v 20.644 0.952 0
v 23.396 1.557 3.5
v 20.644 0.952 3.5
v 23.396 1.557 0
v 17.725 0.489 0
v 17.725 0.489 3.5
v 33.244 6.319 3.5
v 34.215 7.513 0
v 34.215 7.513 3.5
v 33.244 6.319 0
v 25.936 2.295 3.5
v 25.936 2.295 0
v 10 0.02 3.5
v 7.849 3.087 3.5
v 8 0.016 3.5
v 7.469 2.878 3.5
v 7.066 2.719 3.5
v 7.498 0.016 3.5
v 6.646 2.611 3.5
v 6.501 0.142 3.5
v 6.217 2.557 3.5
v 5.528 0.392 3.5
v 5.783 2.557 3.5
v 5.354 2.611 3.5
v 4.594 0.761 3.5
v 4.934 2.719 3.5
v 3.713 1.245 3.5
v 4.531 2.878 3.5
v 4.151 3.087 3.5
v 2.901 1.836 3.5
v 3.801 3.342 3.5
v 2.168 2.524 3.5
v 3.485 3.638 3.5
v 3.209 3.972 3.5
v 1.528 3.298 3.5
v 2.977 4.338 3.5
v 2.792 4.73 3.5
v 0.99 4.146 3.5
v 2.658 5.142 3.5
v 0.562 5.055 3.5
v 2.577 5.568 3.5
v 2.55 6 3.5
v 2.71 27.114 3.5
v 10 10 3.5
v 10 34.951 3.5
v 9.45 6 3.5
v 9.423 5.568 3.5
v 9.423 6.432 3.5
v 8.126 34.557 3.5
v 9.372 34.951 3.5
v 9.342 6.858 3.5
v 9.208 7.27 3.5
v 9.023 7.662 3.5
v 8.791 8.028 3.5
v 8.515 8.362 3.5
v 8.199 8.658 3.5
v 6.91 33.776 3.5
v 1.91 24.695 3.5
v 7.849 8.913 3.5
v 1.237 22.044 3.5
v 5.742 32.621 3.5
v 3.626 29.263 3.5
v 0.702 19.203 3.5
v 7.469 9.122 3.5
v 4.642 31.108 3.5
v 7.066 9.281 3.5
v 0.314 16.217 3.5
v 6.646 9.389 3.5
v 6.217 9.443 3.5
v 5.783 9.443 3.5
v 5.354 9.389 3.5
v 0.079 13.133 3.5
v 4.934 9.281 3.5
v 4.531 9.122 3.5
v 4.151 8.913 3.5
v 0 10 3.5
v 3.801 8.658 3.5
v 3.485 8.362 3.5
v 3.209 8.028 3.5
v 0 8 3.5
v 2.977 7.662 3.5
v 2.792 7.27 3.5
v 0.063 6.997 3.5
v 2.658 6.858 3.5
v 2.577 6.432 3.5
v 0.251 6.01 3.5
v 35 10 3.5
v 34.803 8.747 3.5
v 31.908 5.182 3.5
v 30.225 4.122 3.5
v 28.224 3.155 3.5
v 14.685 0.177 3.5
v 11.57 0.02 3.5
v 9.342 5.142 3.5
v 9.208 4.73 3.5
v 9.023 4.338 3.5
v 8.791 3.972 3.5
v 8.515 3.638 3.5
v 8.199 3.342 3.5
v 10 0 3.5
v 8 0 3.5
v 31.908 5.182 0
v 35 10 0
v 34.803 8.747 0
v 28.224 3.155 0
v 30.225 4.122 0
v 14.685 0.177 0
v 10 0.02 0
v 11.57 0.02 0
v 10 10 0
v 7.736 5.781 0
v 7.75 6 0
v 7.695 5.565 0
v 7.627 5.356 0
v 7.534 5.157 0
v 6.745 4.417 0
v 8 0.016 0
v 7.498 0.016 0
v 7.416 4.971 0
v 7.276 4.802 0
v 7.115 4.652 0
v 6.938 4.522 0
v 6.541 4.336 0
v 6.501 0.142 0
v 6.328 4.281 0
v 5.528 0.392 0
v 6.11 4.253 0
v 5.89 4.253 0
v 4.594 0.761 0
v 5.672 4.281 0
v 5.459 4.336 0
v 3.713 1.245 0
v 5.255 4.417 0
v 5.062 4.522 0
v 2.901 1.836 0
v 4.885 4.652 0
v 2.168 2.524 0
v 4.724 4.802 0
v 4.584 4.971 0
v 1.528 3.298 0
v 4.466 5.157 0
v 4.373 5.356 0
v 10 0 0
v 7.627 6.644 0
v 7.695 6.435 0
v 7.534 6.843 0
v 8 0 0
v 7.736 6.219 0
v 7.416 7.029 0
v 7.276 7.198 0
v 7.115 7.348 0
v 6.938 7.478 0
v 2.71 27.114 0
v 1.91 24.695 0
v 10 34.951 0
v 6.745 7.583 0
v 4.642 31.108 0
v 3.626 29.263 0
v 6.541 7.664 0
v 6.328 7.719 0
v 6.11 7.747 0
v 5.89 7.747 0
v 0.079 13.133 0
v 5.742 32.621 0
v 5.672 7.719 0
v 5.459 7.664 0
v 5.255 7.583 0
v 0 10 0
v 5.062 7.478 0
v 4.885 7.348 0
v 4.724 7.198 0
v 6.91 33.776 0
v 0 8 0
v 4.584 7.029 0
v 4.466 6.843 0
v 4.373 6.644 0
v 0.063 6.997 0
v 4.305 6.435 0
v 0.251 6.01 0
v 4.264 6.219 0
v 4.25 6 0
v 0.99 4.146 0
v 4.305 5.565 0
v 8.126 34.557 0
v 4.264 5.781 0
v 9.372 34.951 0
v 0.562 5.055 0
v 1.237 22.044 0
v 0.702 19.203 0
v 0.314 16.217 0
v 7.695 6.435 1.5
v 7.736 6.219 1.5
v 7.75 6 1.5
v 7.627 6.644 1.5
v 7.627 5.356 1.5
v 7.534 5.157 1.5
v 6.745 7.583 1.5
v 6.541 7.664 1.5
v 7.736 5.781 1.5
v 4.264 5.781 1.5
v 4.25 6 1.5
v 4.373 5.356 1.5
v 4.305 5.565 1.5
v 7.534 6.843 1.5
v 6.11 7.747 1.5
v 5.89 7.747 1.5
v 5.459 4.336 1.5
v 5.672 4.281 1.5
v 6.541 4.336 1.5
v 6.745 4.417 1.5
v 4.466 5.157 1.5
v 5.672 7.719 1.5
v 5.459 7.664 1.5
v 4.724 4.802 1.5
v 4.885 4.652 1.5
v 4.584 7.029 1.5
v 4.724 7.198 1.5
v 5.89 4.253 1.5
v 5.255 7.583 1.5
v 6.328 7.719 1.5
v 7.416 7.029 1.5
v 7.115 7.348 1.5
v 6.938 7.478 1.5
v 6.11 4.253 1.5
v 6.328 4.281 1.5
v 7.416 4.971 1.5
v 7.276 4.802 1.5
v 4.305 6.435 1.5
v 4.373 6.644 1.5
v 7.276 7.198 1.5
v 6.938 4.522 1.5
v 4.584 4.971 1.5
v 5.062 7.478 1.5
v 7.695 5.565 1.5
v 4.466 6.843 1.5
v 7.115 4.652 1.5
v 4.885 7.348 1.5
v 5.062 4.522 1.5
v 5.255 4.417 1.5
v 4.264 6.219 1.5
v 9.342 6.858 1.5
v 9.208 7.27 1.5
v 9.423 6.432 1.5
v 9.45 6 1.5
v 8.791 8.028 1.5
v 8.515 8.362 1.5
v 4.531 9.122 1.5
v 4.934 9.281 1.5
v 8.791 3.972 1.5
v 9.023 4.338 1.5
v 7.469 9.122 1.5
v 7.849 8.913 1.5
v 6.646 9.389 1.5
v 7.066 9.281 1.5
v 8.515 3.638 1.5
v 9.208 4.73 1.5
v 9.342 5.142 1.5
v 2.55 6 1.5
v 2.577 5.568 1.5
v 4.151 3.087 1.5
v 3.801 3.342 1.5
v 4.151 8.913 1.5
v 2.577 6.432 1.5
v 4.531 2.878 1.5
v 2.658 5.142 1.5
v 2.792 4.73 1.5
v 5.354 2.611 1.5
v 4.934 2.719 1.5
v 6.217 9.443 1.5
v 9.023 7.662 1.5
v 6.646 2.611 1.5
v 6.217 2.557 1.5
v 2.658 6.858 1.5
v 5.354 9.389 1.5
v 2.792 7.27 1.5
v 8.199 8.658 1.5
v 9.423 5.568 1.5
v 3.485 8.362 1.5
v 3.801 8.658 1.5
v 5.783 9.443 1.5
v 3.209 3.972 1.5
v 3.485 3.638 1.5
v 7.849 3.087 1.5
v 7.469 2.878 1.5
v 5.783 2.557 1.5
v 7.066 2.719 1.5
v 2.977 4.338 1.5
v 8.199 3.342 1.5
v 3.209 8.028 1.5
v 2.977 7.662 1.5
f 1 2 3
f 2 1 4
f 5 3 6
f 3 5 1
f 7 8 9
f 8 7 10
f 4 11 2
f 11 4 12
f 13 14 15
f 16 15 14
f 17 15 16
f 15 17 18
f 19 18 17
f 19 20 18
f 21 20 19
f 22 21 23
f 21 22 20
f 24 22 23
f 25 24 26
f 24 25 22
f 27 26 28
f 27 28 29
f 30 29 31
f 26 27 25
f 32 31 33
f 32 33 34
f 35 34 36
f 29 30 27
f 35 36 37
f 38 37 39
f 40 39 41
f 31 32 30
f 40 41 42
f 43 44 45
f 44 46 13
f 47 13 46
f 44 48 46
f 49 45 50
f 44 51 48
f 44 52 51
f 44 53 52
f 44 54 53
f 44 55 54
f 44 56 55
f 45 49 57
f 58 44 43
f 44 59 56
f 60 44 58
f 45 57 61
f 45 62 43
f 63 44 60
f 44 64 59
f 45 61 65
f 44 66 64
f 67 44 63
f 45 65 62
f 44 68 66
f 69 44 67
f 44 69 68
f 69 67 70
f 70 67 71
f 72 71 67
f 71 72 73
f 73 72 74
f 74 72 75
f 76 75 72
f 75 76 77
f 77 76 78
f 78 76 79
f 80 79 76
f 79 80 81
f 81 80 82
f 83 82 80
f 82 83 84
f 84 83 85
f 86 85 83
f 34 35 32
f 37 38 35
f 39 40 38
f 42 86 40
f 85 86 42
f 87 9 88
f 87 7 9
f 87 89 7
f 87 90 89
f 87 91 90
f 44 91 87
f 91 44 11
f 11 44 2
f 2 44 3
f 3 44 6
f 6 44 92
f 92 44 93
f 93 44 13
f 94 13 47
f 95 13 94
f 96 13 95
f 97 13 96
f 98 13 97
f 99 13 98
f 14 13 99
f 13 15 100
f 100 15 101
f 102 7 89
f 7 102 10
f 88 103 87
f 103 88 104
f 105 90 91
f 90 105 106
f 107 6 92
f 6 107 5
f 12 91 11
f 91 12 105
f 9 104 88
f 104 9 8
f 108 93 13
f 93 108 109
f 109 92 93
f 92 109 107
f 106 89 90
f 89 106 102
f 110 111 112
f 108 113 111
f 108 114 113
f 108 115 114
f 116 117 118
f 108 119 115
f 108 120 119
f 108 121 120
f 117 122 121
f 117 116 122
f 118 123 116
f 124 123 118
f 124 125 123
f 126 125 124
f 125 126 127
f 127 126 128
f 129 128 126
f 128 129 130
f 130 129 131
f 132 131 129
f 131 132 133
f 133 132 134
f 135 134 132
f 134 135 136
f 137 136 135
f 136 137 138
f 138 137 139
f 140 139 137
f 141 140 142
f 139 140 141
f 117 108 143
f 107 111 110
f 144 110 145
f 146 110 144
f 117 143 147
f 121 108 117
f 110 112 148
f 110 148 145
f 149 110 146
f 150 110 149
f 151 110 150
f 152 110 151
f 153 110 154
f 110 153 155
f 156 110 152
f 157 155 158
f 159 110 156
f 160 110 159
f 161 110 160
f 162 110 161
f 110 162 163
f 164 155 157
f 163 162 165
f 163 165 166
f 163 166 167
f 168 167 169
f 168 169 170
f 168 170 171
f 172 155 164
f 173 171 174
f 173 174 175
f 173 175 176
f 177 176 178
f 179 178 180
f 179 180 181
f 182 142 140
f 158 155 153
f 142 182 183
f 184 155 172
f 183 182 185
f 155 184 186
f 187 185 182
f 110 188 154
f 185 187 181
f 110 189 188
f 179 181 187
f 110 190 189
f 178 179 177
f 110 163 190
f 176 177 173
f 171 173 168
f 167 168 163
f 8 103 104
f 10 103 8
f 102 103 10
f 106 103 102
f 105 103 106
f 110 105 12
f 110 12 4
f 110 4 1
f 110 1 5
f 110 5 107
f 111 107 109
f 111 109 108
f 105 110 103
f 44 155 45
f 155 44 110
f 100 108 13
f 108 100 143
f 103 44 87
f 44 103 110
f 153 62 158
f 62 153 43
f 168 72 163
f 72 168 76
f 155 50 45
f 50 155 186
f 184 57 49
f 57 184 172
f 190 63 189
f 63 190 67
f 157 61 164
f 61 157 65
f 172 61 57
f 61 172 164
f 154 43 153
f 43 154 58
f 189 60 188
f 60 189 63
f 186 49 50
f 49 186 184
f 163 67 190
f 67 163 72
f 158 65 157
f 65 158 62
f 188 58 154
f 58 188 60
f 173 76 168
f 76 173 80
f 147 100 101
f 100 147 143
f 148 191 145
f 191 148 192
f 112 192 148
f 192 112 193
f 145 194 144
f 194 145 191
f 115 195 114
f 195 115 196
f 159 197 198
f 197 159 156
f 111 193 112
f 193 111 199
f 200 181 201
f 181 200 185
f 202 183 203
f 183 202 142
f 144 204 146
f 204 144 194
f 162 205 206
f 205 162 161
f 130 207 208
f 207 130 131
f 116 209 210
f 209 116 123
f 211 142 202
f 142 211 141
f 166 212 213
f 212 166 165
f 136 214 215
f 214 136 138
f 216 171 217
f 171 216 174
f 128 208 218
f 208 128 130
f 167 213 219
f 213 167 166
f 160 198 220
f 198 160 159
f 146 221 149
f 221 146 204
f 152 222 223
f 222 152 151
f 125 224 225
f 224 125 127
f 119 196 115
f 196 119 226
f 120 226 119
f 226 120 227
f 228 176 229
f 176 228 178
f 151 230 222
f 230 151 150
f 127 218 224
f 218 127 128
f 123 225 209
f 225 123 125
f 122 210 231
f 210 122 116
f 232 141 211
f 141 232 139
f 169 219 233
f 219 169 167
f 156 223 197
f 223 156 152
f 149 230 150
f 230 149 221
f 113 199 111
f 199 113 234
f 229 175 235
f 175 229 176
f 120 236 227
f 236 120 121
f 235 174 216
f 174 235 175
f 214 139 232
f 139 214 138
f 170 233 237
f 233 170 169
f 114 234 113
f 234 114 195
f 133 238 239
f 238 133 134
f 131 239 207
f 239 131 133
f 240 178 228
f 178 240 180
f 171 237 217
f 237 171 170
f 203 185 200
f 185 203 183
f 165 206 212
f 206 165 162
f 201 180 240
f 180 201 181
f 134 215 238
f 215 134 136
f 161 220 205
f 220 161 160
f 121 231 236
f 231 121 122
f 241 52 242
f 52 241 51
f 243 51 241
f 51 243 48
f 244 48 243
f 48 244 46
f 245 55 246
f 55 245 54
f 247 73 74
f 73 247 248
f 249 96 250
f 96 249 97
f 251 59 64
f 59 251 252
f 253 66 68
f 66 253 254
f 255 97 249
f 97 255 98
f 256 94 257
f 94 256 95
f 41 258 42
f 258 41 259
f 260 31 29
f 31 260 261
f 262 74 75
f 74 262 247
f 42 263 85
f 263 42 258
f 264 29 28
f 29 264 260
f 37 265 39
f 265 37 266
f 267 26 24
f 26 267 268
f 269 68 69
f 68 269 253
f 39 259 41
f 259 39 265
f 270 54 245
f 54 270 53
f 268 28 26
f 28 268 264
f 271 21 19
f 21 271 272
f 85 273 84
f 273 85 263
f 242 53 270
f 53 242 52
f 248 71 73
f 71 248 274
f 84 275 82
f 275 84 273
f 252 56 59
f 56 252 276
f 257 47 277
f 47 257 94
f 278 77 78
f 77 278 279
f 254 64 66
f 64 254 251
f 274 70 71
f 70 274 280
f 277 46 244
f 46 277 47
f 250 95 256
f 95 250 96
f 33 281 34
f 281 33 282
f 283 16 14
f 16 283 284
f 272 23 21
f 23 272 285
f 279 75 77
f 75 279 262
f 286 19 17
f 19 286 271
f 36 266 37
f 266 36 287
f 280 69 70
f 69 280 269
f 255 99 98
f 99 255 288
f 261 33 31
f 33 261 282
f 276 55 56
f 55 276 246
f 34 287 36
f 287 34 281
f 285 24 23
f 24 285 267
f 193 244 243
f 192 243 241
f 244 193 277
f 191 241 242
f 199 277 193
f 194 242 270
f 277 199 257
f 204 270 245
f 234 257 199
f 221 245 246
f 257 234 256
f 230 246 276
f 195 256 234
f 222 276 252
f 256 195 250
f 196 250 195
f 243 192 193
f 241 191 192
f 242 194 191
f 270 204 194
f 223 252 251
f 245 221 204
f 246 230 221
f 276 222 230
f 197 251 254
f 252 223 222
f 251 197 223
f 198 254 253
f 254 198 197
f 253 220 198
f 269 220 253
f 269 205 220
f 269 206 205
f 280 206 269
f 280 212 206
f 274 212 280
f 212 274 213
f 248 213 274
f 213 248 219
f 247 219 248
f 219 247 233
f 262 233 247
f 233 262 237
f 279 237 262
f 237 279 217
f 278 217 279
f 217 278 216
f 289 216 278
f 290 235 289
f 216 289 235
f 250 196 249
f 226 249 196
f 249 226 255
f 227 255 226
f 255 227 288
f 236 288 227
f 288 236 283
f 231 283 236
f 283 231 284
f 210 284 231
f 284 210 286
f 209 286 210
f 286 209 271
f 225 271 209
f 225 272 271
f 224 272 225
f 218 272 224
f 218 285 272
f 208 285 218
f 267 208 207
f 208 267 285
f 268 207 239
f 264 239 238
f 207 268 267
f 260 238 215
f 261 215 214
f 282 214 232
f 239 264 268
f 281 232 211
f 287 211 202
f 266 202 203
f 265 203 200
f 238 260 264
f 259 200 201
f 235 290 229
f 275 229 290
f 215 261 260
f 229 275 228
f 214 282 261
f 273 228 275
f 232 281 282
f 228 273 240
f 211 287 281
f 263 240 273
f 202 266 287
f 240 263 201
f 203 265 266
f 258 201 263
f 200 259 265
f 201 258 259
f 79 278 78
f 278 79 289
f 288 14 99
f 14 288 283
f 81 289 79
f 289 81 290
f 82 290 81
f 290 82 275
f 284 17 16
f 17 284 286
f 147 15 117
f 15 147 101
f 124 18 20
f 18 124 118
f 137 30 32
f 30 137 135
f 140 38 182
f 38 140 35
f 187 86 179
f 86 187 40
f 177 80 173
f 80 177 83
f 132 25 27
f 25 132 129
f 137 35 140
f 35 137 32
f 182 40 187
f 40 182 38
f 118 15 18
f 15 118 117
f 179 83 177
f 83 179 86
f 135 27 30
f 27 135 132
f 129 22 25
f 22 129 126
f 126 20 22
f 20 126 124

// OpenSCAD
$fn=50;

// General
PLATE_DEPTH = 3.5;

// Screw settings
WASHER_DIAMETER = 6.9;
SCREW_DIAMETER = 3.50;
SCREW_RADIUS_DISTANCE_FROM_GLASS_Y = 4;
SCREW_RADIUS_DISTANCE_FROM_GLASS_X = -4;
SCREW_SUPPPORT_DEPTH = 1.5;

// Arm settings
Y_LENGTH = 35;
Y_THICKNESS = 10;
X_LENGTH = 35;
X_THICKNESS = 10;
CORNER_ROUND_DIAMETER = 8;


module xPartSmoothCylinder() {
    translate([Y_THICKNESS,X_THICKNESS]){
        scale([(X_LENGTH-Y_THICKNESS)/X_THICKNESS, 1, 1])
        cylinder(PLATE_DEPTH, X_THICKNESS, X_THICKNESS);
    }
}

module yPartSmoothCylinder() {
    translate([Y_THICKNESS, X_THICKNESS]){
        scale([1, (Y_LENGTH-X_THICKNESS)/Y_THICKNESS, 1])
        cylinder(PLATE_DEPTH, Y_THICKNESS, Y_THICKNESS);
    }
}

module xPart() {
    intersection(){
        xPartSmoothCylinder();
        translate([Y_THICKNESS, 0])
        cube([X_LENGTH-Y_THICKNESS,X_THICKNESS,PLATE_DEPTH]); 
    }   
}

module yPart() {
    intersection(){
        yPartSmoothCylinder();
        translate ([0, X_THICKNESS])
        cube([Y_THICKNESS,Y_LENGTH-X_THICKNESS,PLATE_DEPTH]);
    }
}

module union_block() {
    cube([Y_THICKNESS, X_THICKNESS, PLATE_DEPTH]);
}

module ScrewHole() {
  cylinder(PLATE_DEPTH, d1=SCREW_DIAMETER, d2=SCREW_DIAMETER, center=false);  
}

module WasherHole() {
    translate([0,0,SCREW_SUPPPORT_DEPTH])
    cylinder(PLATE_DEPTH, d1=WASHER_DIAMETER, d2=WASHER_DIAMETER, center=false);  
}

module RoundedCorner(){
    translate([0, 0])
    difference(){
        cube([CORNER_ROUND_DIAMETER, CORNER_ROUND_DIAMETER, 2 * PLATE_DEPTH]);
        translate([CORNER_ROUND_DIAMETER, CORNER_ROUND_DIAMETER]){
            cylinder(2*PLATE_DEPTH, CORNER_ROUND_DIAMETER, CORNER_ROUND_DIAMETER, center=false);
        }
    }
}

module MakeBracket(){
    difference(){
        union(){
            xPart();
            yPart();
            union_block();
        };
        translate([Y_THICKNESS+SCREW_RADIUS_DISTANCE_FROM_GLASS_X,X_THICKNESS-SCREW_RADIUS_DISTANCE_FROM_GLASS_Y]){
            ScrewHole();
            WasherHole();
        }
        RoundedCorner();
    }
}

MakeBracket();
